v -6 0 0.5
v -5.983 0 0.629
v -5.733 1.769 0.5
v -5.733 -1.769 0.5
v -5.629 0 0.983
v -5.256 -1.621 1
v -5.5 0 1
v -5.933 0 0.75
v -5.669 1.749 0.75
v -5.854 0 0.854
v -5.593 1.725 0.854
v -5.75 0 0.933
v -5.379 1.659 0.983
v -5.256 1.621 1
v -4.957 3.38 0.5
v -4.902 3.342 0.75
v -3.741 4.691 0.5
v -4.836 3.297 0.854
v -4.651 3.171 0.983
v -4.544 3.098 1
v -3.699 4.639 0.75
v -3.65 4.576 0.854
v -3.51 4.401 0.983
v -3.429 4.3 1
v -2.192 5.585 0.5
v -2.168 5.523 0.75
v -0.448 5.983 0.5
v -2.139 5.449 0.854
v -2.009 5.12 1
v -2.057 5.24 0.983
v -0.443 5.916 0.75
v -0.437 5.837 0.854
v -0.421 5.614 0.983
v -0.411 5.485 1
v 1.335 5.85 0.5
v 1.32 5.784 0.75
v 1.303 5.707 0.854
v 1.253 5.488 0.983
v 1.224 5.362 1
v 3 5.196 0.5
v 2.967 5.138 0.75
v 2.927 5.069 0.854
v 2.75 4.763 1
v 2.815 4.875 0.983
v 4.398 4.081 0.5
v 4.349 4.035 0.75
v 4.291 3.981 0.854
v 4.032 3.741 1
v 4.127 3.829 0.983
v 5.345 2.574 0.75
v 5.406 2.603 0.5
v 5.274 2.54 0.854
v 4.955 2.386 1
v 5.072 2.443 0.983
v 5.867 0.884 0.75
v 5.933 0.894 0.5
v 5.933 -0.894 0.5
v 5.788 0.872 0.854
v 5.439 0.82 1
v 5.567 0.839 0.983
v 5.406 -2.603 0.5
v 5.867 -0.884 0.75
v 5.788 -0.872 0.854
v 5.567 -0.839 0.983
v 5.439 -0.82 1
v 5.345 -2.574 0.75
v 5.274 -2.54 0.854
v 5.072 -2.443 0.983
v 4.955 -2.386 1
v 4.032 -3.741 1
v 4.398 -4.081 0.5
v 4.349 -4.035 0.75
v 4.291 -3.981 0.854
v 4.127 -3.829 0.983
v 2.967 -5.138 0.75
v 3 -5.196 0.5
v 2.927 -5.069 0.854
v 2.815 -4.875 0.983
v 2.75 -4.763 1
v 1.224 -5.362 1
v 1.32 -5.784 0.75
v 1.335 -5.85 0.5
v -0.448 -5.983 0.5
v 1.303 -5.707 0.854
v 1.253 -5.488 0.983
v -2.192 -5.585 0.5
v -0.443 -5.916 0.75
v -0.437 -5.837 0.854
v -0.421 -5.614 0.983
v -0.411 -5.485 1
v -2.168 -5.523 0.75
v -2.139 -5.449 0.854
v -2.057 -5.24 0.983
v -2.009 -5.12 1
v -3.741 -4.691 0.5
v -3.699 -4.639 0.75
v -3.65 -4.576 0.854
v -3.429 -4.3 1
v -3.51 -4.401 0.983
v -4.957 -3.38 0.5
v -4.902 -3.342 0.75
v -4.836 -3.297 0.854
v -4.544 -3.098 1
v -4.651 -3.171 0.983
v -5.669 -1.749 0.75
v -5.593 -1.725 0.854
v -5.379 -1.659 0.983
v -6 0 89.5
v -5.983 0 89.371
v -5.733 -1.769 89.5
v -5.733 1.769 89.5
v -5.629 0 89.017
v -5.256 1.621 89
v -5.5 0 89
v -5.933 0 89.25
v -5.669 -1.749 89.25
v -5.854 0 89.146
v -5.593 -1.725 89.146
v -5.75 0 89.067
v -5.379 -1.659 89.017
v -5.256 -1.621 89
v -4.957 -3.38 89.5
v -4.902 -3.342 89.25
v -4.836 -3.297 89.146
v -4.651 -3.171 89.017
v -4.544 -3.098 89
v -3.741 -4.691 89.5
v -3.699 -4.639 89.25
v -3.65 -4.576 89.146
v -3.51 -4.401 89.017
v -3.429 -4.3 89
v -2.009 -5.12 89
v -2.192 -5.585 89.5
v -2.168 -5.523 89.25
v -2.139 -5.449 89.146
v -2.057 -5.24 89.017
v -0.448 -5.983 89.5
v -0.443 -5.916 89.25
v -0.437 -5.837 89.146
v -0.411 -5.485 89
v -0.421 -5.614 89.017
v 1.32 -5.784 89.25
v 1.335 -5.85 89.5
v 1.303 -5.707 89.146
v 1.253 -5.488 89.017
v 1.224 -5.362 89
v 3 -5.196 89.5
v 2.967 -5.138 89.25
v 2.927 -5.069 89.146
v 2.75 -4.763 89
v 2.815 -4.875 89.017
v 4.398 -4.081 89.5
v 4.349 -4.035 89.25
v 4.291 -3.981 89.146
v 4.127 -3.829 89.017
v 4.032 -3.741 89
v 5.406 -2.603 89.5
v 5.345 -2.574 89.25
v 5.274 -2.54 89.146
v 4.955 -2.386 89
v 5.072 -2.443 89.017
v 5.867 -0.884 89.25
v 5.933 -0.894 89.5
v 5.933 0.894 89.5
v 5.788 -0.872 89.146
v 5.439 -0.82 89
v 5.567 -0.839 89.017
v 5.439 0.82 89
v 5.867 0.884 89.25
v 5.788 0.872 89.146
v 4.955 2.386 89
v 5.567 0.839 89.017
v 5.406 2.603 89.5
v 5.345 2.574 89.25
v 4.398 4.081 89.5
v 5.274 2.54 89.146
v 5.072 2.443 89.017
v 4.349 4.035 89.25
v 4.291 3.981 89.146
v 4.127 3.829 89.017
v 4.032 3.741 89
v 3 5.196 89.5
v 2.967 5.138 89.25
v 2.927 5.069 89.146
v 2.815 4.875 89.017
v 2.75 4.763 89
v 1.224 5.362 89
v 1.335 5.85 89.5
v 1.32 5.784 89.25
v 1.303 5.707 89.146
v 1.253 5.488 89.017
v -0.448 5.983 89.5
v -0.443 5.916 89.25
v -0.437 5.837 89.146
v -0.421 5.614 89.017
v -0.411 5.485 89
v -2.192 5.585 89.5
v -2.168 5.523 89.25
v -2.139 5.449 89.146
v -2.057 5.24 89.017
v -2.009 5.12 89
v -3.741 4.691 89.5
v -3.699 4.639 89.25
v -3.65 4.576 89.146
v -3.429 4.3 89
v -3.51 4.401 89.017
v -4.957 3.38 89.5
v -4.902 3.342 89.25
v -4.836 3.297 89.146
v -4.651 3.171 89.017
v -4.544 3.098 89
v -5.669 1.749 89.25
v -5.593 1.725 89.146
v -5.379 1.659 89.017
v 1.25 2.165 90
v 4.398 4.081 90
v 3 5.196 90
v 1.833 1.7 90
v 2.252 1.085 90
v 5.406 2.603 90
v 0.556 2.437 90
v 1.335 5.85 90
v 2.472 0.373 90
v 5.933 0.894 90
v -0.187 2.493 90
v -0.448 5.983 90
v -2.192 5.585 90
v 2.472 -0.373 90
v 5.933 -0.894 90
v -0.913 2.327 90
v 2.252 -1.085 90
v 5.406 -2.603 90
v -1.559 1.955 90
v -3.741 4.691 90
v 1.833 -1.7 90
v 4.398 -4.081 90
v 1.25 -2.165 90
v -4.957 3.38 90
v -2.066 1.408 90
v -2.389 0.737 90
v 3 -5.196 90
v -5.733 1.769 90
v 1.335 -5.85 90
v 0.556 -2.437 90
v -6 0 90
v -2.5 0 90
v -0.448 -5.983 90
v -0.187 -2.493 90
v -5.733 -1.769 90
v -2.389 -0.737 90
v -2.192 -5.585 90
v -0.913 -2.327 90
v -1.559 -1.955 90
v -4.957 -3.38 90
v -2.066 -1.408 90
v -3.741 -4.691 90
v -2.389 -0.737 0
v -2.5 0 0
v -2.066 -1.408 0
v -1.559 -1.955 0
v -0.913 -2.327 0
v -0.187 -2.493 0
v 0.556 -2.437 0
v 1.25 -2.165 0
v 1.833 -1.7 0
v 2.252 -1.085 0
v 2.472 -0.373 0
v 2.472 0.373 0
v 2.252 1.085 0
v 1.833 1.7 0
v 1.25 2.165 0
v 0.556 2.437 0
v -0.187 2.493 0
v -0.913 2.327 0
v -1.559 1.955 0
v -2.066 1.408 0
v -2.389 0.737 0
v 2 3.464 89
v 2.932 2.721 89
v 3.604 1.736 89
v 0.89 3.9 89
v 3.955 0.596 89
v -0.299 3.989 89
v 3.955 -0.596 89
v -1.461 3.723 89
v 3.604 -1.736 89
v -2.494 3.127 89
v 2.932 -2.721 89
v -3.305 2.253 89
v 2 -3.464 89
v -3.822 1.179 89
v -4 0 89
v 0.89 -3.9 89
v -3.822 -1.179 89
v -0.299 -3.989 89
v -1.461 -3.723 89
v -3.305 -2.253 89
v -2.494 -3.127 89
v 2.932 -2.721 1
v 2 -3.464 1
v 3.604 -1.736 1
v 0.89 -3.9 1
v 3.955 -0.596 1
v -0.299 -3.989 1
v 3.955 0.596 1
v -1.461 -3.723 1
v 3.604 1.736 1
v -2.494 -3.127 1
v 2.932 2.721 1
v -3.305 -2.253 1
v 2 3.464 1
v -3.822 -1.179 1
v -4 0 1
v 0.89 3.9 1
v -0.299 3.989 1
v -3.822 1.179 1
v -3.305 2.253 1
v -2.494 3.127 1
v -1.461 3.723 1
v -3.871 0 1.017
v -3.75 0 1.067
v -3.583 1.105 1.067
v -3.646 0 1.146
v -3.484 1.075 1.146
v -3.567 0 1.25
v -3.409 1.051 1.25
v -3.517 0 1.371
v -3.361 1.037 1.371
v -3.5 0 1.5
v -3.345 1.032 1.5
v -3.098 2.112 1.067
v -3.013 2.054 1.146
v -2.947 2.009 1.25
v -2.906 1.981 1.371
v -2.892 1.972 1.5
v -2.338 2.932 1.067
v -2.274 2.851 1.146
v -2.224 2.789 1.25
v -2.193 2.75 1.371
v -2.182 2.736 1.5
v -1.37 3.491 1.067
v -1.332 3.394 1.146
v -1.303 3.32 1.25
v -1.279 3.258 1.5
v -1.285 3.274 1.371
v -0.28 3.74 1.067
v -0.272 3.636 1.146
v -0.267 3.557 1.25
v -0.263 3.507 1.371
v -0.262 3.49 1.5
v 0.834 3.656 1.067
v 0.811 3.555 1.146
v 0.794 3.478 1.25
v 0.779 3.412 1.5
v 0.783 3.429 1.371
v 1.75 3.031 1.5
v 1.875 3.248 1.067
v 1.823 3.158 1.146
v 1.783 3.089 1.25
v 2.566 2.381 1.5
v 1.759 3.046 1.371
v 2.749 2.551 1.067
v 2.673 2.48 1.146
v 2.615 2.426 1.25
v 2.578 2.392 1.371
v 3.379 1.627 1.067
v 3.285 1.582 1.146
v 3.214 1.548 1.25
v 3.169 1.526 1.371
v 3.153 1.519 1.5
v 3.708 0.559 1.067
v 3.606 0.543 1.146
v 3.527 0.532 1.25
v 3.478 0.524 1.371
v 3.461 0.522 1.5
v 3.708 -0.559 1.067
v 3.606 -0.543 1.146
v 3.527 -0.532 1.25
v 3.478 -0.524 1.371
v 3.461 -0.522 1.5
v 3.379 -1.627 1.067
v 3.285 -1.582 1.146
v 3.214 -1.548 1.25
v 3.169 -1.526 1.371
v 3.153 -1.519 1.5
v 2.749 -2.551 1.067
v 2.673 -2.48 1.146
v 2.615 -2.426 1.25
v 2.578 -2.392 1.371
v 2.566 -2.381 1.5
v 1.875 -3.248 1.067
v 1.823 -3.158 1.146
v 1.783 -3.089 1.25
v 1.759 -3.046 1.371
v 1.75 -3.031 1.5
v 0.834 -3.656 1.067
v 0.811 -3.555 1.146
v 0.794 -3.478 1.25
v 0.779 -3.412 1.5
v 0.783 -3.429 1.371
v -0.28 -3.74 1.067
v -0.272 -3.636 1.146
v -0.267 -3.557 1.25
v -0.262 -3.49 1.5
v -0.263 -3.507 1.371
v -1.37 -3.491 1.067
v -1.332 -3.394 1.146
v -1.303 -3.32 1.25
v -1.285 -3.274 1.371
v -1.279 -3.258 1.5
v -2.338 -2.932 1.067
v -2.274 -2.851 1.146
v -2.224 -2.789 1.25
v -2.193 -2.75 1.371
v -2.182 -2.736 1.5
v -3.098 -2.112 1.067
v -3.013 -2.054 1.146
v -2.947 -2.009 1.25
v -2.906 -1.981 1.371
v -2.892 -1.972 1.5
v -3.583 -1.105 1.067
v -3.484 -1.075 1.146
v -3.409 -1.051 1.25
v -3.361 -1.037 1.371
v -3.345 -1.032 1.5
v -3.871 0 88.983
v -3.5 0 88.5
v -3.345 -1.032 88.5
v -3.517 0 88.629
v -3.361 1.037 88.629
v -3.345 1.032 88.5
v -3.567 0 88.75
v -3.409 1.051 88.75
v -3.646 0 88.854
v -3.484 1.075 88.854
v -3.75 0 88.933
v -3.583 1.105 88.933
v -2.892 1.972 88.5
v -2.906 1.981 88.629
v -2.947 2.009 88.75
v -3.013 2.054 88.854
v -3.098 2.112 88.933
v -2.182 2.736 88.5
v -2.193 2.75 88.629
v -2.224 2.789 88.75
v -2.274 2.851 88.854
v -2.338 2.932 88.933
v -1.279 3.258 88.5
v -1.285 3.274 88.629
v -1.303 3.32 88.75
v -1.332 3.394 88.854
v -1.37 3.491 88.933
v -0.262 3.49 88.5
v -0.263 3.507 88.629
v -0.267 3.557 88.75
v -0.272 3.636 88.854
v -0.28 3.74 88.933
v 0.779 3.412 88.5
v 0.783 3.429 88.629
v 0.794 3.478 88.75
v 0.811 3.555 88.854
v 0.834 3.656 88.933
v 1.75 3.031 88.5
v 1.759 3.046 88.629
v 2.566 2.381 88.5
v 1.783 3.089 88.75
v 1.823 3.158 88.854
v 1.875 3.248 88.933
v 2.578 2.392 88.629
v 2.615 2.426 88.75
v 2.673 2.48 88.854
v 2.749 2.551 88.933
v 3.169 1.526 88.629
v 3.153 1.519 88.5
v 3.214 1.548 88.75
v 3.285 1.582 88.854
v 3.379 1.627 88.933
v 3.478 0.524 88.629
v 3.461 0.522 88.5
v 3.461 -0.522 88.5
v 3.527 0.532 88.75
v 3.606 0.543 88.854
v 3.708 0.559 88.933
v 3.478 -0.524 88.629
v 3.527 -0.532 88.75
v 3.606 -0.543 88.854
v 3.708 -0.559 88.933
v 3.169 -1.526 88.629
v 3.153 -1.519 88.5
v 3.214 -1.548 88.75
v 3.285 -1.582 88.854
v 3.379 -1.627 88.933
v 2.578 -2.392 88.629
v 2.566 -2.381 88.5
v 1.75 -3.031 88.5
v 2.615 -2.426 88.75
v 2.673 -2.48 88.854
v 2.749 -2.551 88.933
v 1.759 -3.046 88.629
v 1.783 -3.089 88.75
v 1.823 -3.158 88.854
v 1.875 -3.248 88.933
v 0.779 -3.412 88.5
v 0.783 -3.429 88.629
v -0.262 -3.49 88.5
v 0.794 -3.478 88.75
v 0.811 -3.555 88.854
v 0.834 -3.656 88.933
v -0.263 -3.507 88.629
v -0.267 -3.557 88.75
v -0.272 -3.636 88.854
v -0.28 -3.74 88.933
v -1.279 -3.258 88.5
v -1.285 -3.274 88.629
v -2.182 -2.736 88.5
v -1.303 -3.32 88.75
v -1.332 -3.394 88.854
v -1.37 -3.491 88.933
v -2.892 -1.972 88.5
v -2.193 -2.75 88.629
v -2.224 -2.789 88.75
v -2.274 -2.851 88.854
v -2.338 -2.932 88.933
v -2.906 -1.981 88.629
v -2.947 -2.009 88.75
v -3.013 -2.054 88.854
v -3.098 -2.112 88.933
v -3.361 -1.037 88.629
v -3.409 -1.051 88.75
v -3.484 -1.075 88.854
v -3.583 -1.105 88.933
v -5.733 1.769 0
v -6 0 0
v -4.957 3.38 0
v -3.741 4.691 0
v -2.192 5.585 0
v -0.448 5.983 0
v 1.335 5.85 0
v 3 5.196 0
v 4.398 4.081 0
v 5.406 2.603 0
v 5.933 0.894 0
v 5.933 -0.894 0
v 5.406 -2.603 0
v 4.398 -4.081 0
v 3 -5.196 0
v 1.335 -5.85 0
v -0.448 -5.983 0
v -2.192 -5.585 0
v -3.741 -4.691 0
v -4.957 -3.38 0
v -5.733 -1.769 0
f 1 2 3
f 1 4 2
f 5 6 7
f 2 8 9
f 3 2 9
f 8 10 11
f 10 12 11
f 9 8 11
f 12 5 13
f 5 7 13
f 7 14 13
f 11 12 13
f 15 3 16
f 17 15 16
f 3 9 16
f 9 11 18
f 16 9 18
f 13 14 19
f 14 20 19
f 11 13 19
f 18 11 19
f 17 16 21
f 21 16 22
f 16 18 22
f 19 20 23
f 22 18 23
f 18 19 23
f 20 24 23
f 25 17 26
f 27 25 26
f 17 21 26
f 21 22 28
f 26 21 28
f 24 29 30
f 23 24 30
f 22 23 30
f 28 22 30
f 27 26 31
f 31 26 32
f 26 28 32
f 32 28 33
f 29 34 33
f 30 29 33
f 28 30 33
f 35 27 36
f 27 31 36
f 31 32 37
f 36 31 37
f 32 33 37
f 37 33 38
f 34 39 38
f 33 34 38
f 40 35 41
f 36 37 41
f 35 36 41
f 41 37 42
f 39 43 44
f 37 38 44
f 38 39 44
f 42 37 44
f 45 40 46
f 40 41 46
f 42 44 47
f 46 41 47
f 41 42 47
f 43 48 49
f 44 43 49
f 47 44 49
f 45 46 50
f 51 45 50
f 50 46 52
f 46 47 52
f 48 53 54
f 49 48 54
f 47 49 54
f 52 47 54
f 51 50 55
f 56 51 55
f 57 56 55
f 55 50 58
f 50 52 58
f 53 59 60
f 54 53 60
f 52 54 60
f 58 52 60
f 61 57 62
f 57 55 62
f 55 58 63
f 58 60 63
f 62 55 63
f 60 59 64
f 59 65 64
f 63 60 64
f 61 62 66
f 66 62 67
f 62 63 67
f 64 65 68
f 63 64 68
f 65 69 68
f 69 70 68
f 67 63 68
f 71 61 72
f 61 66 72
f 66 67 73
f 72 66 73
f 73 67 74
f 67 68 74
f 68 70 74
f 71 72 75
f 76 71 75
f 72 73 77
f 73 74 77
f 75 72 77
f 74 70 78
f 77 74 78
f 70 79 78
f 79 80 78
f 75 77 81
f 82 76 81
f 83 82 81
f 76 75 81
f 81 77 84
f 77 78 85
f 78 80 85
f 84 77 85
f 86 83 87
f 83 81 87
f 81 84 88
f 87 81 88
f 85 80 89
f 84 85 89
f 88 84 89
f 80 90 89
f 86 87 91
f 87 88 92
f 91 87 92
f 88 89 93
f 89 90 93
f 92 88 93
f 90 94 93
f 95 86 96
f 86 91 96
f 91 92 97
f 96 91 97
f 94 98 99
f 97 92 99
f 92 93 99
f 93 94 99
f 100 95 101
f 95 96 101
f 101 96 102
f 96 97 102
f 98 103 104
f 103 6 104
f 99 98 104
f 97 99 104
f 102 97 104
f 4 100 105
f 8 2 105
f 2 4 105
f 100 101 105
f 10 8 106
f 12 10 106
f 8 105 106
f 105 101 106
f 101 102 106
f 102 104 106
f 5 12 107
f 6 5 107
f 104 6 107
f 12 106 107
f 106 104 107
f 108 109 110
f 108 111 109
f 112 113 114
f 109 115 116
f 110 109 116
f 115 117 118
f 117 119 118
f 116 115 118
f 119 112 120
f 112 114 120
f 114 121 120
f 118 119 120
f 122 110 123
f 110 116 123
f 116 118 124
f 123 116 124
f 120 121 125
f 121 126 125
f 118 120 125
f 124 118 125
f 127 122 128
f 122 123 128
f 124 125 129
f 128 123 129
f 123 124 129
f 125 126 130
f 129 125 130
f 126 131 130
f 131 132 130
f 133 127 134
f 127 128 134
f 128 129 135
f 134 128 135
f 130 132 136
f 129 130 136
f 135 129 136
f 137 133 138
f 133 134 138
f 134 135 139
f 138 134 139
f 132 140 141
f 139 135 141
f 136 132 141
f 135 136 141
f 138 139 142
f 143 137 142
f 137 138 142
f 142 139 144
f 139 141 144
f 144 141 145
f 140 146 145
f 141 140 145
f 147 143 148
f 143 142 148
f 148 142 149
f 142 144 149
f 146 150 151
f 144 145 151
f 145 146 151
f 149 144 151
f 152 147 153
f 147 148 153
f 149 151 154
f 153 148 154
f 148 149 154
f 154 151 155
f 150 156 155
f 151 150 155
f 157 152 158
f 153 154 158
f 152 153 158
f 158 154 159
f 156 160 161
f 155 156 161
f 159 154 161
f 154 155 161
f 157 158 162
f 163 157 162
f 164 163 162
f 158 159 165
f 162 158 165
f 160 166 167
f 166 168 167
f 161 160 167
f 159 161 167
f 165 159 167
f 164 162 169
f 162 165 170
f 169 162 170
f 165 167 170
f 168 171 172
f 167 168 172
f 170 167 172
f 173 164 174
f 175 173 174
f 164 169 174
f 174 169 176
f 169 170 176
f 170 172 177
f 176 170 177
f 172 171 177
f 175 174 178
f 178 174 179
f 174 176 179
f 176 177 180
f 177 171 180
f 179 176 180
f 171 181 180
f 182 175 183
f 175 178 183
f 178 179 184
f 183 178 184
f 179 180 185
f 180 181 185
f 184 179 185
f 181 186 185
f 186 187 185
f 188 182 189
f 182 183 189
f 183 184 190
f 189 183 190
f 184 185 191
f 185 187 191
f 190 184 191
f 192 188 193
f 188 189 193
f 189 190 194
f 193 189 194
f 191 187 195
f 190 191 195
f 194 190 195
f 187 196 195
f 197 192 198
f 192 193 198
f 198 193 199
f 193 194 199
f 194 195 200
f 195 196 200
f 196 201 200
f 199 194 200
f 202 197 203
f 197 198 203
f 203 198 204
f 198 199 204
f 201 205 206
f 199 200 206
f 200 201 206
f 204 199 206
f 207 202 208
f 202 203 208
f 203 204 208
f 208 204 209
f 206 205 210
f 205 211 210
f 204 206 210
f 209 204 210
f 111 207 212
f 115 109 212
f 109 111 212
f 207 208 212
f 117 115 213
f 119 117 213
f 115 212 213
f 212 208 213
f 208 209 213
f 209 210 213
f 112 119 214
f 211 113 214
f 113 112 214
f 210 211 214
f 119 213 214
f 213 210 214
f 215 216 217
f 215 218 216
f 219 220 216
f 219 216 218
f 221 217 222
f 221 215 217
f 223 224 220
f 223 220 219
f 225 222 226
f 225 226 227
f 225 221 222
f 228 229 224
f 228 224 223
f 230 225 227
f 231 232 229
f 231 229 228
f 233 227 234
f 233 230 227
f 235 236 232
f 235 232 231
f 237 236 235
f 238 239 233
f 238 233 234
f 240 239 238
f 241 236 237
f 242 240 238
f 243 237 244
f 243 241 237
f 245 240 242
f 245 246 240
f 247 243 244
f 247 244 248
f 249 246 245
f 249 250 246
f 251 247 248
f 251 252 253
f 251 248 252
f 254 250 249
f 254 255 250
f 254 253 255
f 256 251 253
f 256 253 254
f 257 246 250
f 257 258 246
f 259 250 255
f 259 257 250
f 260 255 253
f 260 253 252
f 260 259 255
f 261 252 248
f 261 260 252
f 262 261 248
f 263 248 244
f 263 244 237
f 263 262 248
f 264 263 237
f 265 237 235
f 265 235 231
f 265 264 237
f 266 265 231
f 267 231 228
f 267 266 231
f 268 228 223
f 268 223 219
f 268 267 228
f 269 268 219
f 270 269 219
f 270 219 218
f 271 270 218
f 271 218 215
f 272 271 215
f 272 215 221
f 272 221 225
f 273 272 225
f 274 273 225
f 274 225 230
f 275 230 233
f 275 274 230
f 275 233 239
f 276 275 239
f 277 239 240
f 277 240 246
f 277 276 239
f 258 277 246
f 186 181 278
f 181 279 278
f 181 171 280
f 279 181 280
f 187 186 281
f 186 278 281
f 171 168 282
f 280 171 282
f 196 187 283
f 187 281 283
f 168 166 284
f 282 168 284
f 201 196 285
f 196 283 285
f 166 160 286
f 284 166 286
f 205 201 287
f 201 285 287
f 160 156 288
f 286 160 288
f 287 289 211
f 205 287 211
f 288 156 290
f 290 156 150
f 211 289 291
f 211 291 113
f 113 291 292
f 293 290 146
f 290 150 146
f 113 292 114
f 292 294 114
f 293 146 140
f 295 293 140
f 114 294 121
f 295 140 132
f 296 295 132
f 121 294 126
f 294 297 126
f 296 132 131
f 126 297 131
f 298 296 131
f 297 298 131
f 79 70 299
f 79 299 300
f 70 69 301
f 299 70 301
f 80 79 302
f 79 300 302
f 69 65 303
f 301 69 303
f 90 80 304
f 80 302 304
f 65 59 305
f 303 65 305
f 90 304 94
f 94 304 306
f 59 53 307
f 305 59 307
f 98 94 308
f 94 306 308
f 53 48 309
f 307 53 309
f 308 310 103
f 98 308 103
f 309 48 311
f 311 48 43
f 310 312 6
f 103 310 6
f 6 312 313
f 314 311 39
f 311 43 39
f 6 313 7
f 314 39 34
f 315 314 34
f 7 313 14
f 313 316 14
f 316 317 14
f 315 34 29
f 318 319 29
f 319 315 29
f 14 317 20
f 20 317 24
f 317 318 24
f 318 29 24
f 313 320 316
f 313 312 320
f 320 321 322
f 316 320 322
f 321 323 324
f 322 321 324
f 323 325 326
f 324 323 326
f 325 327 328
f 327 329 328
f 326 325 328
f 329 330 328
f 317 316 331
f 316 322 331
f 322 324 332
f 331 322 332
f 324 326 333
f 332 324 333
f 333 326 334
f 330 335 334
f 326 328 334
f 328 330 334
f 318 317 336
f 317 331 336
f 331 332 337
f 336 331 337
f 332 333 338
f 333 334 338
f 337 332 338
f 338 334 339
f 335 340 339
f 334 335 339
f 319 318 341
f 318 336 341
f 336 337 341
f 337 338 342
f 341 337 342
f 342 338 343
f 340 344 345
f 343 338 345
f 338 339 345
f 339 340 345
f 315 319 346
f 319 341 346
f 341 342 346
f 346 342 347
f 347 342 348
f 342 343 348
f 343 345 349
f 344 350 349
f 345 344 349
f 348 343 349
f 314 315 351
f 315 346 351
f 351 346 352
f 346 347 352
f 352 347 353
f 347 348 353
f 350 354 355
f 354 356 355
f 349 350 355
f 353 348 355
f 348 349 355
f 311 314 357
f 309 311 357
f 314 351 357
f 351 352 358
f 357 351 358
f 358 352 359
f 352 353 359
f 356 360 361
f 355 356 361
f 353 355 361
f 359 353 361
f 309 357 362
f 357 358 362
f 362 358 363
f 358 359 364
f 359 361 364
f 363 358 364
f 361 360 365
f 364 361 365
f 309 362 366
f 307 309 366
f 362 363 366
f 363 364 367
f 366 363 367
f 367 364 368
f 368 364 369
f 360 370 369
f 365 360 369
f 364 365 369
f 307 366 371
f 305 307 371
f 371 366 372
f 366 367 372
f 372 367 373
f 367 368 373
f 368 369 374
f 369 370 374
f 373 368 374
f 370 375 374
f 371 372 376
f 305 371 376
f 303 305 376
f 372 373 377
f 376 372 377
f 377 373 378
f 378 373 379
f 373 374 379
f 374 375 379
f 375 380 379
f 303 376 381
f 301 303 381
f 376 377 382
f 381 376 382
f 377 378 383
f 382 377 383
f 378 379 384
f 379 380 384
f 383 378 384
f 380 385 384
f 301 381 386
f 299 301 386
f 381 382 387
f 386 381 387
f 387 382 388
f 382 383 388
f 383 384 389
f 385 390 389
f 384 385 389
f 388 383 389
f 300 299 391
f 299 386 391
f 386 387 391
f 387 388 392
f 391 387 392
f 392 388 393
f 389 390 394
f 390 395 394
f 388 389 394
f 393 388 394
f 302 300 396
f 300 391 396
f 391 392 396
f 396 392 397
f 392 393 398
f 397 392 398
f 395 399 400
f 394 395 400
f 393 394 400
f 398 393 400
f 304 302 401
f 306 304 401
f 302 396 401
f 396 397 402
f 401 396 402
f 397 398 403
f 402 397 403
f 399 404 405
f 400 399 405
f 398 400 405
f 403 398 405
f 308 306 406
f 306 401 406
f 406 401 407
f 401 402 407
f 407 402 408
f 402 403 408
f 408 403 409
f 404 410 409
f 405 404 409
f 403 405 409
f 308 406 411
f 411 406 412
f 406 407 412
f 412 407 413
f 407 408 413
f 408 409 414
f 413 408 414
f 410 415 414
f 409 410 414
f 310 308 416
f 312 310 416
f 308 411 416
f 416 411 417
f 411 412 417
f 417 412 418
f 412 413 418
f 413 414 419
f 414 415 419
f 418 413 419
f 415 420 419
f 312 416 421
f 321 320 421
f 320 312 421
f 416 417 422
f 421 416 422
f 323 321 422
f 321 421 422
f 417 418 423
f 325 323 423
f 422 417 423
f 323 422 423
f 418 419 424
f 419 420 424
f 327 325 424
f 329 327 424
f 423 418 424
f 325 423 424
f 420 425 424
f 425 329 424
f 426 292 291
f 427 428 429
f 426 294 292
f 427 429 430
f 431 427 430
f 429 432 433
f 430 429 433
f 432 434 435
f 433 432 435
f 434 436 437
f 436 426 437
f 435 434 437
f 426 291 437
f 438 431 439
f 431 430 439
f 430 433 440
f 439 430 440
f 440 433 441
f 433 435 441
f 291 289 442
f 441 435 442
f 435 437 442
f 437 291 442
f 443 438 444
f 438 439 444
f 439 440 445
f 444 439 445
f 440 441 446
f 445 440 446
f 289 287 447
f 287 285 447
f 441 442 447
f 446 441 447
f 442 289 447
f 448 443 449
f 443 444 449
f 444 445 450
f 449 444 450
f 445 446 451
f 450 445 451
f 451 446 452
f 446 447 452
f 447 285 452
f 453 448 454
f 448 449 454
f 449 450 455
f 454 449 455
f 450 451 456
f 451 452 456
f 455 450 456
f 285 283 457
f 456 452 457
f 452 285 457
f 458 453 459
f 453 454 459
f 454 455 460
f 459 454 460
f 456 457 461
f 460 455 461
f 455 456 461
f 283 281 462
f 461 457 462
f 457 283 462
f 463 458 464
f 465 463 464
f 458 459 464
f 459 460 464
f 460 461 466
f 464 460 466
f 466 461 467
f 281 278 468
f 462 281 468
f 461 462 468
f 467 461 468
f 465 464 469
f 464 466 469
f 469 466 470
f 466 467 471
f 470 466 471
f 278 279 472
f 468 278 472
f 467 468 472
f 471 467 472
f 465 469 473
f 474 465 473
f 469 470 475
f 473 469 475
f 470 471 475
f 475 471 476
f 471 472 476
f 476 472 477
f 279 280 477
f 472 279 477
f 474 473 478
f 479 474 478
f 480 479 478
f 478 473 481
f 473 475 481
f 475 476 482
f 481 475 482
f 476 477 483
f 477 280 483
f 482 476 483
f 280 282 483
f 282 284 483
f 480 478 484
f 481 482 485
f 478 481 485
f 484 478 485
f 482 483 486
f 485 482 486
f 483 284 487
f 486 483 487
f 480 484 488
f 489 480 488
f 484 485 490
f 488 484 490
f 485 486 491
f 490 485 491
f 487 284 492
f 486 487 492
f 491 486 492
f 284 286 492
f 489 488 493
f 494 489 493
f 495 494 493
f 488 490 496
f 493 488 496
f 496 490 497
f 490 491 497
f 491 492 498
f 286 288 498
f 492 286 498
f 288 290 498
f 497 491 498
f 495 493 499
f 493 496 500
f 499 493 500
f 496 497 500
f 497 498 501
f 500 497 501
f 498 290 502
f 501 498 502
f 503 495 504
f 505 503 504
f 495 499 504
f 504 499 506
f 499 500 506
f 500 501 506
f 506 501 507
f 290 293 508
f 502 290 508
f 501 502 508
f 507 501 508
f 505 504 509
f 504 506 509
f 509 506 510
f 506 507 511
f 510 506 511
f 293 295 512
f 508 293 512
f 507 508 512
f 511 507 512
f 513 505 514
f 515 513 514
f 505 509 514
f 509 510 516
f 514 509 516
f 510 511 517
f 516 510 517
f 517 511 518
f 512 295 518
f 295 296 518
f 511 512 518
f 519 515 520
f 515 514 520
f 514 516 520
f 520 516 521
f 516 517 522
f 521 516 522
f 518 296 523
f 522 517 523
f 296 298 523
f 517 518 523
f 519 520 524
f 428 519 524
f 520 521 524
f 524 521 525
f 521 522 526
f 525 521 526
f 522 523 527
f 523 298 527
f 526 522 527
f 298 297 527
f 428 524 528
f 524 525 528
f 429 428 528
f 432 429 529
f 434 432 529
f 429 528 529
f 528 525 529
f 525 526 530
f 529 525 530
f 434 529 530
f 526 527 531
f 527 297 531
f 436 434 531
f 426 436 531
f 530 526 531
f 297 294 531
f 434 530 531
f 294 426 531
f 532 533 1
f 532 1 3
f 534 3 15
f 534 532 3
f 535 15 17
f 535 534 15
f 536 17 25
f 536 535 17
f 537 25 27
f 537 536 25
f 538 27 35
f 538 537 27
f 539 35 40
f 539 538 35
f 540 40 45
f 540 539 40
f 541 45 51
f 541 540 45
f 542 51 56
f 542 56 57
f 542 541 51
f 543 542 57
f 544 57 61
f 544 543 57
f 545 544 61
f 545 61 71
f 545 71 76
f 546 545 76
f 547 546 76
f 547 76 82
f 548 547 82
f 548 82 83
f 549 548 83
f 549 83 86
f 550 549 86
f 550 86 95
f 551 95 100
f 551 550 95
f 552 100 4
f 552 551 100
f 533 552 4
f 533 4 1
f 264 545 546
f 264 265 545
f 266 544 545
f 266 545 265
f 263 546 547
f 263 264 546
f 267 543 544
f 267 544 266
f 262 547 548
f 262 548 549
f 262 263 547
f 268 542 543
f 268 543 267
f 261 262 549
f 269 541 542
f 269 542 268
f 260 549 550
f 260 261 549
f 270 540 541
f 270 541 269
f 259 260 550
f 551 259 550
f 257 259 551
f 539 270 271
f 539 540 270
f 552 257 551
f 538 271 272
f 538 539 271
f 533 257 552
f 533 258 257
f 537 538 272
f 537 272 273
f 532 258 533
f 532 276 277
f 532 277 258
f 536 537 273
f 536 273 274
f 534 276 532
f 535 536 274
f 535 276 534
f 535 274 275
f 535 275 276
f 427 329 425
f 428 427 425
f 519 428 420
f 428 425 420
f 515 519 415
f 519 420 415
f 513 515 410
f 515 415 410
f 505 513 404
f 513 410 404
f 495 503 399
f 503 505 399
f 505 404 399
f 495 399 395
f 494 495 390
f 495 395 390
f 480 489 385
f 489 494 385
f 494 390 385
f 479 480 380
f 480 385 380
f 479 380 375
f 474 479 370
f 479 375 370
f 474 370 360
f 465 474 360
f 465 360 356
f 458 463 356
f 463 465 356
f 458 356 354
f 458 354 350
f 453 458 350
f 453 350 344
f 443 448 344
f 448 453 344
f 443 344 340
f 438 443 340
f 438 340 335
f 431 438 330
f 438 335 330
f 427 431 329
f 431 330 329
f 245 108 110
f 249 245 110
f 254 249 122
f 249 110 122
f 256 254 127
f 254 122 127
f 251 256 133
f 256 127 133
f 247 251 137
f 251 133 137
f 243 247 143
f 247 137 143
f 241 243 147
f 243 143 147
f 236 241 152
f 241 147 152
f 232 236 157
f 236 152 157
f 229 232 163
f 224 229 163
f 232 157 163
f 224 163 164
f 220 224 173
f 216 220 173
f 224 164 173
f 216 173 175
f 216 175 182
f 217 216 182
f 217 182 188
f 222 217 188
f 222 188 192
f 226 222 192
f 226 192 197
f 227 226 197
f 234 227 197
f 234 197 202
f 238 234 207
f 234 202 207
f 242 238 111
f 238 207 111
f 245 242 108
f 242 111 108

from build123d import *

# Parameters (mm, degrees)
SKETCH_1_R      = 3.5
SKETCH_1_R_2    = 2.5
EXTRUDE_1_DEPTH = 90
SKETCH_2_R      = 6
SKETCH_2_R_2    = 2.5
EXTRUDE_2_DEPTH = 1
EXTRUDE_START   = -1
SKETCH_3_R      = 6
SKETCH_3_R_2    = 2.5
EXTRUDE_3_DEPTH = 1
FILLET_1_R      = 0.5


with BuildPart() as part:
    # 草图1 → 凸台-拉伸1 (new body)
    with BuildSketch(Plane.XY):
        with Locations(Location((0, 0, 0), (0, 0, 180))):
            Circle(SKETCH_1_R)
        with Locations(Location((0, 0, 0), (0, 0, 180))):
            Circle(SKETCH_1_R_2, mode=Mode.SUBTRACT)
    extrude(amount=EXTRUDE_1_DEPTH)

    # 草图2 → 凸台-拉伸2 (add)
    with BuildSketch(Plane(origin=(0, 0, 0), x_dir=(-1, 0, 0), z_dir=(0, 0, -1))):
        Circle(SKETCH_2_R)
        Circle(SKETCH_2_R_2, mode=Mode.SUBTRACT)
    extrude(amount=-EXTRUDE_2_DEPTH)

    # 草图3 → 凸台-拉伸3 (add)
    with BuildSketch(Plane.XY.offset(90).offset(EXTRUDE_START)):
        with Locations(Location((0, 0, 0), (0, 0, 180))):
            Circle(SKETCH_3_R)
        with Locations(Location((0, 0, 0), (0, 0, 180))):
            Circle(SKETCH_3_R_2, mode=Mode.SUBTRACT)
    extrude(amount=EXTRUDE_3_DEPTH)

    # 圆角1
    fillet_1_edges = [part.edges().sort_by_distance(p)[0] for p in [
        (3.5, 0, 1),
        (6, 0, 1),
        (3.5, 0, 89),
        (6, 0, 89),
    ]]
    fillet(fillet_1_edges, radius=FILLET_1_R)


solid = part.part
